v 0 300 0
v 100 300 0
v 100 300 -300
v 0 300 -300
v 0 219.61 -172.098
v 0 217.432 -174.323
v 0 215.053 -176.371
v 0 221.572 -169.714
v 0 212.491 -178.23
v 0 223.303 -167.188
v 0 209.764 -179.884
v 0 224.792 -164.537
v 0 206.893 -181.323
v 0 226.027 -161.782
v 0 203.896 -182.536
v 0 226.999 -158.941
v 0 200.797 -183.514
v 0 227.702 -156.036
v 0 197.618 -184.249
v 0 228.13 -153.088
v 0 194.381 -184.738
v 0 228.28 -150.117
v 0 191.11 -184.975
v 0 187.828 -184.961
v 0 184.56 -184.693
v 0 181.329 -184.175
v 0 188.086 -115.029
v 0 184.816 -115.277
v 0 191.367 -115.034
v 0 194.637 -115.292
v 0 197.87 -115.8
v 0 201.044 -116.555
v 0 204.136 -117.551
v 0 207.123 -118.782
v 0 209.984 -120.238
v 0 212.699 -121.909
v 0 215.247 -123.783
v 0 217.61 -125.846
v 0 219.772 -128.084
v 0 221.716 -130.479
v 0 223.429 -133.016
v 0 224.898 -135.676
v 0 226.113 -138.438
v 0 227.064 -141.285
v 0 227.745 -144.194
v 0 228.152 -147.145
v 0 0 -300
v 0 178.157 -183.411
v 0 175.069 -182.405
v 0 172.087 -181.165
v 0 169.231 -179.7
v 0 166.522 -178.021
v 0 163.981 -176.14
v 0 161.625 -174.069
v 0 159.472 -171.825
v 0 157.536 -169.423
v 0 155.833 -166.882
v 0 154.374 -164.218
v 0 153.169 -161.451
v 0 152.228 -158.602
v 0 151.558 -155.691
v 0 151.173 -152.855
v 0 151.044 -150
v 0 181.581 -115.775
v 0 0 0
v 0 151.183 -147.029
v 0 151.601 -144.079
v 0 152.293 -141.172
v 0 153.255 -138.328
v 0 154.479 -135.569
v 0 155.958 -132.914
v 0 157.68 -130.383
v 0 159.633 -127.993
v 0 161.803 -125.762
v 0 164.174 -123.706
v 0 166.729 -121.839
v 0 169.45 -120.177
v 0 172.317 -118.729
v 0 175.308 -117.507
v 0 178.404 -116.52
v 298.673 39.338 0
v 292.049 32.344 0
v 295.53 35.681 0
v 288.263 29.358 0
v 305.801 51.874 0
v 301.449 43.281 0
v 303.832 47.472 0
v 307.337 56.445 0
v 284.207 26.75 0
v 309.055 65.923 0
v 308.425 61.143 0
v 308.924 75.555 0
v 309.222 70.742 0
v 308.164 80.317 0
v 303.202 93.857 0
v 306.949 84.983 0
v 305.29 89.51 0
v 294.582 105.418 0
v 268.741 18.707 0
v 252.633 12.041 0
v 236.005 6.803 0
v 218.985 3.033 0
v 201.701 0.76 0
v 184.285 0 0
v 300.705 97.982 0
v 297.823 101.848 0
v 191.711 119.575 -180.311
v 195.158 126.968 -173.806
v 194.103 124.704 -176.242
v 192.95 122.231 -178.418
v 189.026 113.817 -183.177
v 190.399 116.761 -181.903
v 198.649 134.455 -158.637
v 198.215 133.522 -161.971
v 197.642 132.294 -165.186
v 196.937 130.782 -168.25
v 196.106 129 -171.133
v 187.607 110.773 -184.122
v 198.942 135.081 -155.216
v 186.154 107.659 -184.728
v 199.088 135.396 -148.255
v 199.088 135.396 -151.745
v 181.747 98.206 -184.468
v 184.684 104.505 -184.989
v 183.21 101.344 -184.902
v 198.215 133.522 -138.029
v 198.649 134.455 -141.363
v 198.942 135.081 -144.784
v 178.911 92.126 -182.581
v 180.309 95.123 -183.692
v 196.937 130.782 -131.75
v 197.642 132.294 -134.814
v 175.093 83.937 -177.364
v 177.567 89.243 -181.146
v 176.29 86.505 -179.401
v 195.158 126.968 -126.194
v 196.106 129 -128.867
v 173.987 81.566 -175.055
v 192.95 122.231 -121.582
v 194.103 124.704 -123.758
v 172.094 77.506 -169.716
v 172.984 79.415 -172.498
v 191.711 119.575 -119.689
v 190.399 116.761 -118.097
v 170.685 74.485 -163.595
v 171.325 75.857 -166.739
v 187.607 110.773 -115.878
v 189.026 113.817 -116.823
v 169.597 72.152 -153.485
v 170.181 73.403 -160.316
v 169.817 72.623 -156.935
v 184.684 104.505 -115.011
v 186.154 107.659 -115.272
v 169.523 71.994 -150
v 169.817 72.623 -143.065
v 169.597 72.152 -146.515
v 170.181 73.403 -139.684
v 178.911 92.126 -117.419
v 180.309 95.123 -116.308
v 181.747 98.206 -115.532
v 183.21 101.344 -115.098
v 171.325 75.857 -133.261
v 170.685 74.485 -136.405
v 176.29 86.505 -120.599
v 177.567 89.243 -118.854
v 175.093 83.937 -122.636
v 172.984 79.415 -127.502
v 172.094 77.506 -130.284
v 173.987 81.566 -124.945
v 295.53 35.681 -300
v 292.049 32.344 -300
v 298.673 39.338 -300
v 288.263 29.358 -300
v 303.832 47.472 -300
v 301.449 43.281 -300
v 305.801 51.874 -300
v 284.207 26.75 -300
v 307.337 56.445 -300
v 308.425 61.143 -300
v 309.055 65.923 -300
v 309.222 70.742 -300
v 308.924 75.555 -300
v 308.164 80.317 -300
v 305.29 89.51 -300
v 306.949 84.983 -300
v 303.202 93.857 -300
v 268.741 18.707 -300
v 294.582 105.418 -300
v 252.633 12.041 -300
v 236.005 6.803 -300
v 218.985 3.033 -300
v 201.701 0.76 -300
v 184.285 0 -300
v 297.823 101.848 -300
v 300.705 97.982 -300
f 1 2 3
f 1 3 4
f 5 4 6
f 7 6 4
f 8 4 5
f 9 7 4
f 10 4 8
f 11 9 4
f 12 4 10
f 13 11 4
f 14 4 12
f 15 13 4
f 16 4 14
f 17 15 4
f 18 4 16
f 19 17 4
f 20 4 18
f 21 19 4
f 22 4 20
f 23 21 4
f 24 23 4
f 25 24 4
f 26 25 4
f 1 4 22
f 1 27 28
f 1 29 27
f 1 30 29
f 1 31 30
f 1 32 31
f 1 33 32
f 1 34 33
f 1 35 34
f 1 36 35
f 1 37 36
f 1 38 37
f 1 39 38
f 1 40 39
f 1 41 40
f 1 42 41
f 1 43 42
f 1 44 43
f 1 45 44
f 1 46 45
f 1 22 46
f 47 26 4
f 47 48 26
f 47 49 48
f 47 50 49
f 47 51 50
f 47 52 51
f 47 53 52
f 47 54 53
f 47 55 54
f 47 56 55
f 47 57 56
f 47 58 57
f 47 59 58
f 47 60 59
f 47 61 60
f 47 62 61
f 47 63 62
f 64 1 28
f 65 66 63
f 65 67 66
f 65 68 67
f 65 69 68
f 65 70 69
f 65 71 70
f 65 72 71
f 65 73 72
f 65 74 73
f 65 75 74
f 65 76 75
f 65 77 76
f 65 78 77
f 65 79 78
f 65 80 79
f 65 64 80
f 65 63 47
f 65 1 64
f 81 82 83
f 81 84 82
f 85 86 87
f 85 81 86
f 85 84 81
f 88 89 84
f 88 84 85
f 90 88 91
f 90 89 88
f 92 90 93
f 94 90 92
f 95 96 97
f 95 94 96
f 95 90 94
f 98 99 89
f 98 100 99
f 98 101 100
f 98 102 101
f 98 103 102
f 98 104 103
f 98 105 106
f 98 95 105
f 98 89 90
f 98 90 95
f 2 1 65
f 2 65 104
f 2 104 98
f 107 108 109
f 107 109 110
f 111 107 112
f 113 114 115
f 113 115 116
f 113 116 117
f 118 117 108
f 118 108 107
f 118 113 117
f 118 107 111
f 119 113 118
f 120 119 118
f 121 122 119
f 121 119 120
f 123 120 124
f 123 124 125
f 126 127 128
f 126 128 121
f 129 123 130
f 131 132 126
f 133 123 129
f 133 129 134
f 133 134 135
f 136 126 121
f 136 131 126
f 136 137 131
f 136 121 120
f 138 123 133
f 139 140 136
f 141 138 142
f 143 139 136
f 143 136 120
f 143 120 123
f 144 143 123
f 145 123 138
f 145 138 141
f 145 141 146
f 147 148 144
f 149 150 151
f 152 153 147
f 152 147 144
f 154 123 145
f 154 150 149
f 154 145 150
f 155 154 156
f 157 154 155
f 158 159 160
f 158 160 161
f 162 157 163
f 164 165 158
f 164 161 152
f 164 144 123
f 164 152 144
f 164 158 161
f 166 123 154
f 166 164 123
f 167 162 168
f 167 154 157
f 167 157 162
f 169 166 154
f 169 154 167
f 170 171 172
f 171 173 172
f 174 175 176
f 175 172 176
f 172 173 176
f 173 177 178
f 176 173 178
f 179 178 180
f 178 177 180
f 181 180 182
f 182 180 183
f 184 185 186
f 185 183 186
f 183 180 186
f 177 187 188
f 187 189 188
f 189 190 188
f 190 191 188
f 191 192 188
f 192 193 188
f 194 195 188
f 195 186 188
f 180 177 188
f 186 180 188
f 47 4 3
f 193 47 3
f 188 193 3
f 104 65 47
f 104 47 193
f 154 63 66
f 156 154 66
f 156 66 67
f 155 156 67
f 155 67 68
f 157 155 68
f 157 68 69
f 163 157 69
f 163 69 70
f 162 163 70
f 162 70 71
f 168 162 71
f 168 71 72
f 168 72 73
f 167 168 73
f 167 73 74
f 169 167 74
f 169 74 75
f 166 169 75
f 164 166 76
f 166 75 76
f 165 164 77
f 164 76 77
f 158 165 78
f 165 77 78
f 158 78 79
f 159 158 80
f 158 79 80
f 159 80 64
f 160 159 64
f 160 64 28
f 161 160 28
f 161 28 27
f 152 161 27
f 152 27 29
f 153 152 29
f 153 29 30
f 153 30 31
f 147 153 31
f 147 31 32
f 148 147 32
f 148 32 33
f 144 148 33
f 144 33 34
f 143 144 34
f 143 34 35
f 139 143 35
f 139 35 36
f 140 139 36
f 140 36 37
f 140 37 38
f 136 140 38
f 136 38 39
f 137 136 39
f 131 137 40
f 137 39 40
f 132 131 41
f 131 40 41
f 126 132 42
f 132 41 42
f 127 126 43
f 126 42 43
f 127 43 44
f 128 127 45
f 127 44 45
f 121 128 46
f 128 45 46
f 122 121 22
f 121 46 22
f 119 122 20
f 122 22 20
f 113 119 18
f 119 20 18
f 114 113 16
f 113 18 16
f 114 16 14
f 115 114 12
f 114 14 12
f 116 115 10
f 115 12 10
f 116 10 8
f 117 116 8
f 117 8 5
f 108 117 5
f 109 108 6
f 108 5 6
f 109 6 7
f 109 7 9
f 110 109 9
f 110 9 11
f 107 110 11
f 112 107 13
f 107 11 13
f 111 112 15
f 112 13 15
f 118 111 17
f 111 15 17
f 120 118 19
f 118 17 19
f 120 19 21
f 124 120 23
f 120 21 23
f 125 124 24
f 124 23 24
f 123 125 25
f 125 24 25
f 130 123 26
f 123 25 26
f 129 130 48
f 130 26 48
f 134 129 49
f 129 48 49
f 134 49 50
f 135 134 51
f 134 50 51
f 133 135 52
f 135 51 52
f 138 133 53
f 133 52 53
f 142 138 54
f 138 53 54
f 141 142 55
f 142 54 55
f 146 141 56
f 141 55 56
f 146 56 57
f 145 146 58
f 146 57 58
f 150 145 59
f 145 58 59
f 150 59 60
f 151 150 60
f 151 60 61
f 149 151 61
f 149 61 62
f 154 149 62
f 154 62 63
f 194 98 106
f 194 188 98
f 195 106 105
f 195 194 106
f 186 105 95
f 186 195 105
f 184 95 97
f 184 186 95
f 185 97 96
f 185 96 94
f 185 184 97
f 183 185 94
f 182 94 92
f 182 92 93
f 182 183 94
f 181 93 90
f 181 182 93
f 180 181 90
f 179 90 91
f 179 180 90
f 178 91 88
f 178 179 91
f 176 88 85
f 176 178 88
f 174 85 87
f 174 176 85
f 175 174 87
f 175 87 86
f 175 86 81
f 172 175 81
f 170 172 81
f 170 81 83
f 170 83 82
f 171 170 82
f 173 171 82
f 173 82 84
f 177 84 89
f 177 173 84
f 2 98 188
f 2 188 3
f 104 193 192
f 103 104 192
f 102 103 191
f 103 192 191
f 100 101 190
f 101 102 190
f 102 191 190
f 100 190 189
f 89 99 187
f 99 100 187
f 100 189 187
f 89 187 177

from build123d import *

# Parameters (mm, degrees)
F1_DEPTH    = 300
F2_T1_DEPTH = 778.5765609082
F3_R        = 50
F5_R        = 35
F6_DEPTH    = 250


# Not quite as in the source:
# - a fillet or chamfer that OpenCascade refuses, or shapes differently, is made with other operations: its cross-section is extruded or revolved along the edge and cut away or added


with BuildPart() as f1:
    # F0 (on Top) → F1 (new body)
    with BuildSketch(Plane.XY):
        Polygon((0, 300), (0, 0), (280, 0), (333.3452377916, 66.6547622084), (100, 300), align=None)
    extrude(amount=-F1_DEPTH)

    # F2: fillet of radius 200 on 1 edges, made by hand

    # F2_s2 → F2_t1 (cut)
    with BuildSketch(Plane.XY.offset(-539.2882804541)):
        with BuildLine():
            ThreePointArc((184.2846878184, 0), (265.9270556236, 17.4225540239), (333.3452377916, 66.6547622084))
            Line((333.3452377916, 66.6547622084), (280, 0))
            Line((280, 0), (184.2846878184, 0))
        make_face()
    extrude(amount=F2_T1_DEPTH, mode=Mode.SUBTRACT)

    # F3
    f3_edges = [f1.edges().sort_by_distance(p)[0] for p in [
        (333.345238, 66.654762, -150),
    ]]
    fillet(f3_edges, radius=F3_R)

    # F5 (on face) → F6 (cut)
    with BuildSketch(Plane(origin=(-114.9066664678, 53.581858547, 0), x_dir=(-0.4226182617, -0.906307787, 0), z_dir=(-0.906307787, 0.4226182617, 0))):
        with Locations((-171.892336111, -150)):
            Circle(F5_R)
    extrude(amount=-F6_DEPTH, mode=Mode.SUBTRACT)


solid = f1.part
